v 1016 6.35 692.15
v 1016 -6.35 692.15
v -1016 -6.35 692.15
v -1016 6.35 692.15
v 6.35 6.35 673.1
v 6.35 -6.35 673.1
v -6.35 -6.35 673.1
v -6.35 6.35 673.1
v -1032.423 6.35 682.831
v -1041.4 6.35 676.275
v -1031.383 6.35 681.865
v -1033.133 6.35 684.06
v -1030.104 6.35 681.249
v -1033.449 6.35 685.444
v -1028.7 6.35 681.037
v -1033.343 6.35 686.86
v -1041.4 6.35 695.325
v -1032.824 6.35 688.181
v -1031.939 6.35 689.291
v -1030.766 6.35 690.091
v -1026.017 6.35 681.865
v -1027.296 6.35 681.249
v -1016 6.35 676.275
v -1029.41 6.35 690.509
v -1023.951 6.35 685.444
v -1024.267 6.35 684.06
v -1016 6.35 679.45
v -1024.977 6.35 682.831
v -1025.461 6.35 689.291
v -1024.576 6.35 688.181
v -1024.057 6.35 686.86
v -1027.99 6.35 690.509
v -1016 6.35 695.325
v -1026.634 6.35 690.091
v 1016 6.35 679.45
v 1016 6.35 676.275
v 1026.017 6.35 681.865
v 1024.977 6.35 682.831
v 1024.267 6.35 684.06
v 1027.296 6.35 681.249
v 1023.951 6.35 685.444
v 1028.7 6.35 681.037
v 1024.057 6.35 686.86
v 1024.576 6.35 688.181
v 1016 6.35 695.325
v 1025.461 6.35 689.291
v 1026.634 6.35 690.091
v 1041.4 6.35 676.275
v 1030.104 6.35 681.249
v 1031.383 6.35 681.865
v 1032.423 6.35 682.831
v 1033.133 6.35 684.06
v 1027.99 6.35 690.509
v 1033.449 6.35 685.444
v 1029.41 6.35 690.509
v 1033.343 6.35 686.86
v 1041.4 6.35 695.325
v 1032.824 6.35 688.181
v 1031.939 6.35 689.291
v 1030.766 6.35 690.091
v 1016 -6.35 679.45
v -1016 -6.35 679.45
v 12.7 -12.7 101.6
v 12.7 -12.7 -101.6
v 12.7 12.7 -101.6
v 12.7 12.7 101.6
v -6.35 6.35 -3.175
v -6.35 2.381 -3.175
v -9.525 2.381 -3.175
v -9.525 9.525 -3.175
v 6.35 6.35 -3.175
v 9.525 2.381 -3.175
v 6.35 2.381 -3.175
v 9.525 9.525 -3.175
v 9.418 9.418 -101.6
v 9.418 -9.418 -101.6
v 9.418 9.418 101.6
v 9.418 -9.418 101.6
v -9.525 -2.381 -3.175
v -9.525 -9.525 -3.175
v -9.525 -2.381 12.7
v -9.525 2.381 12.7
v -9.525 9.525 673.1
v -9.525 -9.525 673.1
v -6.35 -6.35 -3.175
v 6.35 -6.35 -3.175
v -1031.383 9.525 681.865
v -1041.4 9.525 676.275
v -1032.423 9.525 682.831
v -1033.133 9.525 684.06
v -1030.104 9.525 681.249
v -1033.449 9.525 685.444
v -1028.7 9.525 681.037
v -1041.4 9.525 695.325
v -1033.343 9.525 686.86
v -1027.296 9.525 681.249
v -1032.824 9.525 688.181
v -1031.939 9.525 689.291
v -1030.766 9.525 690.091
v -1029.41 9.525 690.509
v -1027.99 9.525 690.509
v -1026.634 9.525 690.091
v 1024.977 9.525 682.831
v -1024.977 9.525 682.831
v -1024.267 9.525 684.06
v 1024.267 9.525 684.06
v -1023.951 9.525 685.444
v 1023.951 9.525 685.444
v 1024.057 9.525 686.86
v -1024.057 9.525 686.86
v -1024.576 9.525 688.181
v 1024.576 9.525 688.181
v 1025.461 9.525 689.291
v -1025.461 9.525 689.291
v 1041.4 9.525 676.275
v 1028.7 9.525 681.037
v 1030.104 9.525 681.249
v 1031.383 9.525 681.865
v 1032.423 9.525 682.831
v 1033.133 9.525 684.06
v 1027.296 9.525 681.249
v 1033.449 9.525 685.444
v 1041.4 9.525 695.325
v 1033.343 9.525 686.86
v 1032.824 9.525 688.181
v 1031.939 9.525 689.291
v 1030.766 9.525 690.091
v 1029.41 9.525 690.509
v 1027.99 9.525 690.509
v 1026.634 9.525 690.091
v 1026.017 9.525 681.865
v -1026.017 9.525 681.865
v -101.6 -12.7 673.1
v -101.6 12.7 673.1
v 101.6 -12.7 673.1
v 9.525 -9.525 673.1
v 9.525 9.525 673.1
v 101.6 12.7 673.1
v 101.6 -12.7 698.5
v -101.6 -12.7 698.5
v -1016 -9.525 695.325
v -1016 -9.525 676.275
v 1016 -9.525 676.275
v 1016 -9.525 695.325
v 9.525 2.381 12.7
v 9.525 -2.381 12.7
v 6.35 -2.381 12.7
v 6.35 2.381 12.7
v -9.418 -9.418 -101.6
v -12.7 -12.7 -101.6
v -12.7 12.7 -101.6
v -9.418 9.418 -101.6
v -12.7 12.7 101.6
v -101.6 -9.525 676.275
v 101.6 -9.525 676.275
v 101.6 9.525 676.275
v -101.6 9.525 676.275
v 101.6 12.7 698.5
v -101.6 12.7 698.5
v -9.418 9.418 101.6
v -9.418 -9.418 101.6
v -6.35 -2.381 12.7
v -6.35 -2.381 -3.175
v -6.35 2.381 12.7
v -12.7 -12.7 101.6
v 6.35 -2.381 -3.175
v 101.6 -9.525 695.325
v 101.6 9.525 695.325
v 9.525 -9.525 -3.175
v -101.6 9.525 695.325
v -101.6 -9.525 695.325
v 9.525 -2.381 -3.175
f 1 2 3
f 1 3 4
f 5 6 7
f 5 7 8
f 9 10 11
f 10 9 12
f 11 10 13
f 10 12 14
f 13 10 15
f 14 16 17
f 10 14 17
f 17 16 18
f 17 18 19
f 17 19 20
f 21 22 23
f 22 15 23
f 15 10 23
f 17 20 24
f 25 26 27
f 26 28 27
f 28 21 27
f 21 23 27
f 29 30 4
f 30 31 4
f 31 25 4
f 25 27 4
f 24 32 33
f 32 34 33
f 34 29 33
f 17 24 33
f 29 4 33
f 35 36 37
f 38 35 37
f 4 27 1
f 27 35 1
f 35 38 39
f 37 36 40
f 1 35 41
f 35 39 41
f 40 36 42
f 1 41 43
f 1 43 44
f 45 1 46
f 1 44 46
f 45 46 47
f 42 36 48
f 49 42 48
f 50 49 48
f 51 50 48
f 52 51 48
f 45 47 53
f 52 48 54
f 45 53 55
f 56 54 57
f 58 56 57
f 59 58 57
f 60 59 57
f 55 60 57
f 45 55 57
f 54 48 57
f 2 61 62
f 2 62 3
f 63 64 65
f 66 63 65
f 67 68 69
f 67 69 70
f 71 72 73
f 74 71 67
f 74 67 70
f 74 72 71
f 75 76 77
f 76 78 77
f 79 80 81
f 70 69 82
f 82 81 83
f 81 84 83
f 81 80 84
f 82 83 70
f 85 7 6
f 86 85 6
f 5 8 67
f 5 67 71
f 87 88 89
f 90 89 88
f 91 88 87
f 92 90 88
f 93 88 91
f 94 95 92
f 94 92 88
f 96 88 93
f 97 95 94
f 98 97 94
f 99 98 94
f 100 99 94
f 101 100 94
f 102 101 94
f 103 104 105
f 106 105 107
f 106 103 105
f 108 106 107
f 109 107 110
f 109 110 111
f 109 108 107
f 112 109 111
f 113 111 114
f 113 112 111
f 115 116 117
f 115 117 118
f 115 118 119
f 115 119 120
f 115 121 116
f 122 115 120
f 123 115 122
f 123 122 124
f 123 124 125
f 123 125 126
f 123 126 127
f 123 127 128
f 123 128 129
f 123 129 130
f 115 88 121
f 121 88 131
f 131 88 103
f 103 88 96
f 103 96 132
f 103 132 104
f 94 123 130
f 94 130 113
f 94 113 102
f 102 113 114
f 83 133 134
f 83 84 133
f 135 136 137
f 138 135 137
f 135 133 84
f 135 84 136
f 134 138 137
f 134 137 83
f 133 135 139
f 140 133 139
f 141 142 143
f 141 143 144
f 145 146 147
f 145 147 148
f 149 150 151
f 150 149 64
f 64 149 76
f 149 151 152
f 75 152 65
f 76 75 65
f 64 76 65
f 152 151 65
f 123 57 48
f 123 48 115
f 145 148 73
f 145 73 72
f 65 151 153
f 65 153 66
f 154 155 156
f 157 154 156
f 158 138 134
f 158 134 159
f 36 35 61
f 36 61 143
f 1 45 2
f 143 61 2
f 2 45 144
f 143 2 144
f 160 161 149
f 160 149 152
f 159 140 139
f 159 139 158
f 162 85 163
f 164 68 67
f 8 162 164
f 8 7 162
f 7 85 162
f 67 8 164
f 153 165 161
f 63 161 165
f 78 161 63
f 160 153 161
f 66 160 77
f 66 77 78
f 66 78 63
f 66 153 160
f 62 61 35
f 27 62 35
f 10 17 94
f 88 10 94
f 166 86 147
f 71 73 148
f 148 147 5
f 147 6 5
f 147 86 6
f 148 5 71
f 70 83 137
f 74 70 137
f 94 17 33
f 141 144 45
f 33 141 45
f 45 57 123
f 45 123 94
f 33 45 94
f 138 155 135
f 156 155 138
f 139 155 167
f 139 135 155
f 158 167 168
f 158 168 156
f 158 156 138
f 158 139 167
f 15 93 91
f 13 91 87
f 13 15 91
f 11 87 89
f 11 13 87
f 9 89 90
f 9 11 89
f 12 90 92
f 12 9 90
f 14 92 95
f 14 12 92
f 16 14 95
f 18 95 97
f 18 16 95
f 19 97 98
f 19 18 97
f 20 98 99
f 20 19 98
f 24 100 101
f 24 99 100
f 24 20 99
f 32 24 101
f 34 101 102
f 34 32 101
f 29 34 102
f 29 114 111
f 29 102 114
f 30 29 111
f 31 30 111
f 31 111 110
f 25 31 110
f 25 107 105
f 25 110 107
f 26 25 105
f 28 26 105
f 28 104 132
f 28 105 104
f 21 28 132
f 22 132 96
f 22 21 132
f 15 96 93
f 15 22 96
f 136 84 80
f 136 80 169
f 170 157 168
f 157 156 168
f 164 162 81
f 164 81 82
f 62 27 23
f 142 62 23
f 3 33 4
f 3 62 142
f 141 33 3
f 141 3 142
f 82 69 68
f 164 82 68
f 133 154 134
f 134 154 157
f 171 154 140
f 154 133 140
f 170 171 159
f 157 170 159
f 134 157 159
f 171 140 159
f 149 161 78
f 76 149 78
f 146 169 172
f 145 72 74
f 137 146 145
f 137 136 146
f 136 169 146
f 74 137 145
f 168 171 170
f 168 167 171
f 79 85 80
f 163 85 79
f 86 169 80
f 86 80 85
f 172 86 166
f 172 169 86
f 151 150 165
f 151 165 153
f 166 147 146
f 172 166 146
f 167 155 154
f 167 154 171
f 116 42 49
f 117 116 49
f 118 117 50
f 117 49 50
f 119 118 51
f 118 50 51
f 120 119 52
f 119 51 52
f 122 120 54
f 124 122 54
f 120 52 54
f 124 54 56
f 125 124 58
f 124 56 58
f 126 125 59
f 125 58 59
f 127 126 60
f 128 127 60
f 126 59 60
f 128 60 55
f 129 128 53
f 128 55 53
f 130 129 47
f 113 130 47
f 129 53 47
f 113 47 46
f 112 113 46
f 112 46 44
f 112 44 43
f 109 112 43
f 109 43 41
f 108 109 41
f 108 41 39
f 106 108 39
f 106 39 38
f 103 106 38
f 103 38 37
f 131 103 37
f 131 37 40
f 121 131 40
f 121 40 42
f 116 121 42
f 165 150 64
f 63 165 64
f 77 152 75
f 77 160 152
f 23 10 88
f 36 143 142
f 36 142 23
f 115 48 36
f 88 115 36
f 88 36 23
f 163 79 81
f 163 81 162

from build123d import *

# Parameters (mm, degrees)
SKETCH_W        = 19.05
SKETCH_H        = 19.05
SKETCH_W_2      = 12.7
SKETCH_H_2      = 12.7
PAD_DEPTH       = 1041.4
SKETCH001_W     = 15.875
SKETCH001_H     = 25.4
POCKET_DEPTH    = 2102.547835
SKETCH002_R     = 4.7625
POCKET001_DEPTH = 2086.672835
SKETCH003_W     = 25.4
SKETCH003_H     = 25.4
SKETCH003_W_2   = 19.05
SKETCH003_H_2   = 19.05
PAD001_DEPTH    = 101.6
SKETCH004_W     = 19.05
SKETCH004_H     = 19.05
SKETCH004_W_2   = 12.7
SKETCH004_H_2   = 12.7
PAD002_DEPTH    = 676.275
SKETCH005_W     = 4.7625
SKETCH005_H     = 19.05
POCKET002_DEPTH = 15.875
SKETCH006_W     = 25.4
SKETCH006_H     = 25.4
SKETCH006_W_2   = 18.835748
SKETCH006_H_2   = 18.835748
PAD003_DEPTH    = 101.6


with BuildPart() as crossbeam:
    # Sketch → Pad (new body)
    with BuildSketch(Plane.YZ):
        with Locations((0, 685.8)):
            Rectangle(SKETCH_W, SKETCH_H)
        with Locations((0, 685.8)):
            Rectangle(SKETCH_W_2, SKETCH_H_2, mode=Mode.SUBTRACT)
    pad = extrude(amount=PAD_DEPTH)

    # Sketch001 (on Face1 of Pad) → Pocket (cut, through all)
    with BuildSketch(Plane(origin=(0, 0, 695.325), x_dir=(0, -1, 0), z_dir=(0, 0, 1))):
        with Locations((1.5875, 1028.7)):
            Rectangle(SKETCH001_W, SKETCH001_H)
    pocket = extrude(amount=-POCKET_DEPTH, mode=Mode.SUBTRACT)

    # Sketch002 (on Face13 of Pocket) → Pocket001 (cut, through all)
    with BuildSketch(Plane(origin=(0, 6.35, 0), x_dir=(0, 0, -1), z_dir=(0, -1, 0))):
        with Locations((-685.8, 1028.7)):
            Circle(SKETCH002_R)
    pocket001 = extrude(amount=-POCKET001_DEPTH, mode=Mode.SUBTRACT)

    # Mirrored: Pad, Pocket, Pocket001 across Sketch002 H_Axis
    add(pad.mirror(Plane(origin=(0, 6.35, 0), x_dir=(0, -1, 0), z_dir=(1, 0, 0))))
    add(pocket.mirror(Plane(origin=(0, 6.35, 0), x_dir=(0, -1, 0), z_dir=(1, 0, 0))), mode=Mode.SUBTRACT)
    add(pocket001.mirror(Plane(origin=(0, 6.35, 0), x_dir=(0, -1, 0), z_dir=(1, 0, 0))), mode=Mode.SUBTRACT)


with BuildPart() as carriage:
    # Sketch003 → Pad001 (new body, symmetric)
    with BuildSketch(Plane.YZ):
        with Locations((0, 685.8)):
            Rectangle(SKETCH003_W, SKETCH003_H)
        with Locations((0, 685.8)):
            Rectangle(SKETCH003_W_2, SKETCH003_H_2, mode=Mode.SUBTRACT)
    extrude(amount=PAD001_DEPTH, both=True)

    # Sketch004 (on Face3 of Pad001) → Pad002 (join)
    with BuildSketch(Plane.YX.offset(-673.1)):
        Rectangle(SKETCH004_W, SKETCH004_H)
        Rectangle(SKETCH004_W_2, SKETCH004_H_2, mode=Mode.SUBTRACT)
    extrude(amount=PAD002_DEPTH)

    # Sketch005 (on Face15 of Pad002) → Pocket002 (cut)
    with BuildSketch(Plane.YX.offset(3.175)):
        Rectangle(SKETCH005_W, SKETCH005_H)
    extrude(amount=-POCKET002_DEPTH, mode=Mode.SUBTRACT)


with BuildPart() as body002:
    # Sketch006 → Pad003 (new body, symmetric)
    with BuildSketch(Plane.XY):
        Rectangle(SKETCH006_W, SKETCH006_H)
        Rectangle(SKETCH006_W_2, SKETCH006_H_2, mode=Mode.SUBTRACT)
    extrude(amount=PAD003_DEPTH, both=True)


solid = Compound([crossbeam.part, carriage.part, body002.part])
